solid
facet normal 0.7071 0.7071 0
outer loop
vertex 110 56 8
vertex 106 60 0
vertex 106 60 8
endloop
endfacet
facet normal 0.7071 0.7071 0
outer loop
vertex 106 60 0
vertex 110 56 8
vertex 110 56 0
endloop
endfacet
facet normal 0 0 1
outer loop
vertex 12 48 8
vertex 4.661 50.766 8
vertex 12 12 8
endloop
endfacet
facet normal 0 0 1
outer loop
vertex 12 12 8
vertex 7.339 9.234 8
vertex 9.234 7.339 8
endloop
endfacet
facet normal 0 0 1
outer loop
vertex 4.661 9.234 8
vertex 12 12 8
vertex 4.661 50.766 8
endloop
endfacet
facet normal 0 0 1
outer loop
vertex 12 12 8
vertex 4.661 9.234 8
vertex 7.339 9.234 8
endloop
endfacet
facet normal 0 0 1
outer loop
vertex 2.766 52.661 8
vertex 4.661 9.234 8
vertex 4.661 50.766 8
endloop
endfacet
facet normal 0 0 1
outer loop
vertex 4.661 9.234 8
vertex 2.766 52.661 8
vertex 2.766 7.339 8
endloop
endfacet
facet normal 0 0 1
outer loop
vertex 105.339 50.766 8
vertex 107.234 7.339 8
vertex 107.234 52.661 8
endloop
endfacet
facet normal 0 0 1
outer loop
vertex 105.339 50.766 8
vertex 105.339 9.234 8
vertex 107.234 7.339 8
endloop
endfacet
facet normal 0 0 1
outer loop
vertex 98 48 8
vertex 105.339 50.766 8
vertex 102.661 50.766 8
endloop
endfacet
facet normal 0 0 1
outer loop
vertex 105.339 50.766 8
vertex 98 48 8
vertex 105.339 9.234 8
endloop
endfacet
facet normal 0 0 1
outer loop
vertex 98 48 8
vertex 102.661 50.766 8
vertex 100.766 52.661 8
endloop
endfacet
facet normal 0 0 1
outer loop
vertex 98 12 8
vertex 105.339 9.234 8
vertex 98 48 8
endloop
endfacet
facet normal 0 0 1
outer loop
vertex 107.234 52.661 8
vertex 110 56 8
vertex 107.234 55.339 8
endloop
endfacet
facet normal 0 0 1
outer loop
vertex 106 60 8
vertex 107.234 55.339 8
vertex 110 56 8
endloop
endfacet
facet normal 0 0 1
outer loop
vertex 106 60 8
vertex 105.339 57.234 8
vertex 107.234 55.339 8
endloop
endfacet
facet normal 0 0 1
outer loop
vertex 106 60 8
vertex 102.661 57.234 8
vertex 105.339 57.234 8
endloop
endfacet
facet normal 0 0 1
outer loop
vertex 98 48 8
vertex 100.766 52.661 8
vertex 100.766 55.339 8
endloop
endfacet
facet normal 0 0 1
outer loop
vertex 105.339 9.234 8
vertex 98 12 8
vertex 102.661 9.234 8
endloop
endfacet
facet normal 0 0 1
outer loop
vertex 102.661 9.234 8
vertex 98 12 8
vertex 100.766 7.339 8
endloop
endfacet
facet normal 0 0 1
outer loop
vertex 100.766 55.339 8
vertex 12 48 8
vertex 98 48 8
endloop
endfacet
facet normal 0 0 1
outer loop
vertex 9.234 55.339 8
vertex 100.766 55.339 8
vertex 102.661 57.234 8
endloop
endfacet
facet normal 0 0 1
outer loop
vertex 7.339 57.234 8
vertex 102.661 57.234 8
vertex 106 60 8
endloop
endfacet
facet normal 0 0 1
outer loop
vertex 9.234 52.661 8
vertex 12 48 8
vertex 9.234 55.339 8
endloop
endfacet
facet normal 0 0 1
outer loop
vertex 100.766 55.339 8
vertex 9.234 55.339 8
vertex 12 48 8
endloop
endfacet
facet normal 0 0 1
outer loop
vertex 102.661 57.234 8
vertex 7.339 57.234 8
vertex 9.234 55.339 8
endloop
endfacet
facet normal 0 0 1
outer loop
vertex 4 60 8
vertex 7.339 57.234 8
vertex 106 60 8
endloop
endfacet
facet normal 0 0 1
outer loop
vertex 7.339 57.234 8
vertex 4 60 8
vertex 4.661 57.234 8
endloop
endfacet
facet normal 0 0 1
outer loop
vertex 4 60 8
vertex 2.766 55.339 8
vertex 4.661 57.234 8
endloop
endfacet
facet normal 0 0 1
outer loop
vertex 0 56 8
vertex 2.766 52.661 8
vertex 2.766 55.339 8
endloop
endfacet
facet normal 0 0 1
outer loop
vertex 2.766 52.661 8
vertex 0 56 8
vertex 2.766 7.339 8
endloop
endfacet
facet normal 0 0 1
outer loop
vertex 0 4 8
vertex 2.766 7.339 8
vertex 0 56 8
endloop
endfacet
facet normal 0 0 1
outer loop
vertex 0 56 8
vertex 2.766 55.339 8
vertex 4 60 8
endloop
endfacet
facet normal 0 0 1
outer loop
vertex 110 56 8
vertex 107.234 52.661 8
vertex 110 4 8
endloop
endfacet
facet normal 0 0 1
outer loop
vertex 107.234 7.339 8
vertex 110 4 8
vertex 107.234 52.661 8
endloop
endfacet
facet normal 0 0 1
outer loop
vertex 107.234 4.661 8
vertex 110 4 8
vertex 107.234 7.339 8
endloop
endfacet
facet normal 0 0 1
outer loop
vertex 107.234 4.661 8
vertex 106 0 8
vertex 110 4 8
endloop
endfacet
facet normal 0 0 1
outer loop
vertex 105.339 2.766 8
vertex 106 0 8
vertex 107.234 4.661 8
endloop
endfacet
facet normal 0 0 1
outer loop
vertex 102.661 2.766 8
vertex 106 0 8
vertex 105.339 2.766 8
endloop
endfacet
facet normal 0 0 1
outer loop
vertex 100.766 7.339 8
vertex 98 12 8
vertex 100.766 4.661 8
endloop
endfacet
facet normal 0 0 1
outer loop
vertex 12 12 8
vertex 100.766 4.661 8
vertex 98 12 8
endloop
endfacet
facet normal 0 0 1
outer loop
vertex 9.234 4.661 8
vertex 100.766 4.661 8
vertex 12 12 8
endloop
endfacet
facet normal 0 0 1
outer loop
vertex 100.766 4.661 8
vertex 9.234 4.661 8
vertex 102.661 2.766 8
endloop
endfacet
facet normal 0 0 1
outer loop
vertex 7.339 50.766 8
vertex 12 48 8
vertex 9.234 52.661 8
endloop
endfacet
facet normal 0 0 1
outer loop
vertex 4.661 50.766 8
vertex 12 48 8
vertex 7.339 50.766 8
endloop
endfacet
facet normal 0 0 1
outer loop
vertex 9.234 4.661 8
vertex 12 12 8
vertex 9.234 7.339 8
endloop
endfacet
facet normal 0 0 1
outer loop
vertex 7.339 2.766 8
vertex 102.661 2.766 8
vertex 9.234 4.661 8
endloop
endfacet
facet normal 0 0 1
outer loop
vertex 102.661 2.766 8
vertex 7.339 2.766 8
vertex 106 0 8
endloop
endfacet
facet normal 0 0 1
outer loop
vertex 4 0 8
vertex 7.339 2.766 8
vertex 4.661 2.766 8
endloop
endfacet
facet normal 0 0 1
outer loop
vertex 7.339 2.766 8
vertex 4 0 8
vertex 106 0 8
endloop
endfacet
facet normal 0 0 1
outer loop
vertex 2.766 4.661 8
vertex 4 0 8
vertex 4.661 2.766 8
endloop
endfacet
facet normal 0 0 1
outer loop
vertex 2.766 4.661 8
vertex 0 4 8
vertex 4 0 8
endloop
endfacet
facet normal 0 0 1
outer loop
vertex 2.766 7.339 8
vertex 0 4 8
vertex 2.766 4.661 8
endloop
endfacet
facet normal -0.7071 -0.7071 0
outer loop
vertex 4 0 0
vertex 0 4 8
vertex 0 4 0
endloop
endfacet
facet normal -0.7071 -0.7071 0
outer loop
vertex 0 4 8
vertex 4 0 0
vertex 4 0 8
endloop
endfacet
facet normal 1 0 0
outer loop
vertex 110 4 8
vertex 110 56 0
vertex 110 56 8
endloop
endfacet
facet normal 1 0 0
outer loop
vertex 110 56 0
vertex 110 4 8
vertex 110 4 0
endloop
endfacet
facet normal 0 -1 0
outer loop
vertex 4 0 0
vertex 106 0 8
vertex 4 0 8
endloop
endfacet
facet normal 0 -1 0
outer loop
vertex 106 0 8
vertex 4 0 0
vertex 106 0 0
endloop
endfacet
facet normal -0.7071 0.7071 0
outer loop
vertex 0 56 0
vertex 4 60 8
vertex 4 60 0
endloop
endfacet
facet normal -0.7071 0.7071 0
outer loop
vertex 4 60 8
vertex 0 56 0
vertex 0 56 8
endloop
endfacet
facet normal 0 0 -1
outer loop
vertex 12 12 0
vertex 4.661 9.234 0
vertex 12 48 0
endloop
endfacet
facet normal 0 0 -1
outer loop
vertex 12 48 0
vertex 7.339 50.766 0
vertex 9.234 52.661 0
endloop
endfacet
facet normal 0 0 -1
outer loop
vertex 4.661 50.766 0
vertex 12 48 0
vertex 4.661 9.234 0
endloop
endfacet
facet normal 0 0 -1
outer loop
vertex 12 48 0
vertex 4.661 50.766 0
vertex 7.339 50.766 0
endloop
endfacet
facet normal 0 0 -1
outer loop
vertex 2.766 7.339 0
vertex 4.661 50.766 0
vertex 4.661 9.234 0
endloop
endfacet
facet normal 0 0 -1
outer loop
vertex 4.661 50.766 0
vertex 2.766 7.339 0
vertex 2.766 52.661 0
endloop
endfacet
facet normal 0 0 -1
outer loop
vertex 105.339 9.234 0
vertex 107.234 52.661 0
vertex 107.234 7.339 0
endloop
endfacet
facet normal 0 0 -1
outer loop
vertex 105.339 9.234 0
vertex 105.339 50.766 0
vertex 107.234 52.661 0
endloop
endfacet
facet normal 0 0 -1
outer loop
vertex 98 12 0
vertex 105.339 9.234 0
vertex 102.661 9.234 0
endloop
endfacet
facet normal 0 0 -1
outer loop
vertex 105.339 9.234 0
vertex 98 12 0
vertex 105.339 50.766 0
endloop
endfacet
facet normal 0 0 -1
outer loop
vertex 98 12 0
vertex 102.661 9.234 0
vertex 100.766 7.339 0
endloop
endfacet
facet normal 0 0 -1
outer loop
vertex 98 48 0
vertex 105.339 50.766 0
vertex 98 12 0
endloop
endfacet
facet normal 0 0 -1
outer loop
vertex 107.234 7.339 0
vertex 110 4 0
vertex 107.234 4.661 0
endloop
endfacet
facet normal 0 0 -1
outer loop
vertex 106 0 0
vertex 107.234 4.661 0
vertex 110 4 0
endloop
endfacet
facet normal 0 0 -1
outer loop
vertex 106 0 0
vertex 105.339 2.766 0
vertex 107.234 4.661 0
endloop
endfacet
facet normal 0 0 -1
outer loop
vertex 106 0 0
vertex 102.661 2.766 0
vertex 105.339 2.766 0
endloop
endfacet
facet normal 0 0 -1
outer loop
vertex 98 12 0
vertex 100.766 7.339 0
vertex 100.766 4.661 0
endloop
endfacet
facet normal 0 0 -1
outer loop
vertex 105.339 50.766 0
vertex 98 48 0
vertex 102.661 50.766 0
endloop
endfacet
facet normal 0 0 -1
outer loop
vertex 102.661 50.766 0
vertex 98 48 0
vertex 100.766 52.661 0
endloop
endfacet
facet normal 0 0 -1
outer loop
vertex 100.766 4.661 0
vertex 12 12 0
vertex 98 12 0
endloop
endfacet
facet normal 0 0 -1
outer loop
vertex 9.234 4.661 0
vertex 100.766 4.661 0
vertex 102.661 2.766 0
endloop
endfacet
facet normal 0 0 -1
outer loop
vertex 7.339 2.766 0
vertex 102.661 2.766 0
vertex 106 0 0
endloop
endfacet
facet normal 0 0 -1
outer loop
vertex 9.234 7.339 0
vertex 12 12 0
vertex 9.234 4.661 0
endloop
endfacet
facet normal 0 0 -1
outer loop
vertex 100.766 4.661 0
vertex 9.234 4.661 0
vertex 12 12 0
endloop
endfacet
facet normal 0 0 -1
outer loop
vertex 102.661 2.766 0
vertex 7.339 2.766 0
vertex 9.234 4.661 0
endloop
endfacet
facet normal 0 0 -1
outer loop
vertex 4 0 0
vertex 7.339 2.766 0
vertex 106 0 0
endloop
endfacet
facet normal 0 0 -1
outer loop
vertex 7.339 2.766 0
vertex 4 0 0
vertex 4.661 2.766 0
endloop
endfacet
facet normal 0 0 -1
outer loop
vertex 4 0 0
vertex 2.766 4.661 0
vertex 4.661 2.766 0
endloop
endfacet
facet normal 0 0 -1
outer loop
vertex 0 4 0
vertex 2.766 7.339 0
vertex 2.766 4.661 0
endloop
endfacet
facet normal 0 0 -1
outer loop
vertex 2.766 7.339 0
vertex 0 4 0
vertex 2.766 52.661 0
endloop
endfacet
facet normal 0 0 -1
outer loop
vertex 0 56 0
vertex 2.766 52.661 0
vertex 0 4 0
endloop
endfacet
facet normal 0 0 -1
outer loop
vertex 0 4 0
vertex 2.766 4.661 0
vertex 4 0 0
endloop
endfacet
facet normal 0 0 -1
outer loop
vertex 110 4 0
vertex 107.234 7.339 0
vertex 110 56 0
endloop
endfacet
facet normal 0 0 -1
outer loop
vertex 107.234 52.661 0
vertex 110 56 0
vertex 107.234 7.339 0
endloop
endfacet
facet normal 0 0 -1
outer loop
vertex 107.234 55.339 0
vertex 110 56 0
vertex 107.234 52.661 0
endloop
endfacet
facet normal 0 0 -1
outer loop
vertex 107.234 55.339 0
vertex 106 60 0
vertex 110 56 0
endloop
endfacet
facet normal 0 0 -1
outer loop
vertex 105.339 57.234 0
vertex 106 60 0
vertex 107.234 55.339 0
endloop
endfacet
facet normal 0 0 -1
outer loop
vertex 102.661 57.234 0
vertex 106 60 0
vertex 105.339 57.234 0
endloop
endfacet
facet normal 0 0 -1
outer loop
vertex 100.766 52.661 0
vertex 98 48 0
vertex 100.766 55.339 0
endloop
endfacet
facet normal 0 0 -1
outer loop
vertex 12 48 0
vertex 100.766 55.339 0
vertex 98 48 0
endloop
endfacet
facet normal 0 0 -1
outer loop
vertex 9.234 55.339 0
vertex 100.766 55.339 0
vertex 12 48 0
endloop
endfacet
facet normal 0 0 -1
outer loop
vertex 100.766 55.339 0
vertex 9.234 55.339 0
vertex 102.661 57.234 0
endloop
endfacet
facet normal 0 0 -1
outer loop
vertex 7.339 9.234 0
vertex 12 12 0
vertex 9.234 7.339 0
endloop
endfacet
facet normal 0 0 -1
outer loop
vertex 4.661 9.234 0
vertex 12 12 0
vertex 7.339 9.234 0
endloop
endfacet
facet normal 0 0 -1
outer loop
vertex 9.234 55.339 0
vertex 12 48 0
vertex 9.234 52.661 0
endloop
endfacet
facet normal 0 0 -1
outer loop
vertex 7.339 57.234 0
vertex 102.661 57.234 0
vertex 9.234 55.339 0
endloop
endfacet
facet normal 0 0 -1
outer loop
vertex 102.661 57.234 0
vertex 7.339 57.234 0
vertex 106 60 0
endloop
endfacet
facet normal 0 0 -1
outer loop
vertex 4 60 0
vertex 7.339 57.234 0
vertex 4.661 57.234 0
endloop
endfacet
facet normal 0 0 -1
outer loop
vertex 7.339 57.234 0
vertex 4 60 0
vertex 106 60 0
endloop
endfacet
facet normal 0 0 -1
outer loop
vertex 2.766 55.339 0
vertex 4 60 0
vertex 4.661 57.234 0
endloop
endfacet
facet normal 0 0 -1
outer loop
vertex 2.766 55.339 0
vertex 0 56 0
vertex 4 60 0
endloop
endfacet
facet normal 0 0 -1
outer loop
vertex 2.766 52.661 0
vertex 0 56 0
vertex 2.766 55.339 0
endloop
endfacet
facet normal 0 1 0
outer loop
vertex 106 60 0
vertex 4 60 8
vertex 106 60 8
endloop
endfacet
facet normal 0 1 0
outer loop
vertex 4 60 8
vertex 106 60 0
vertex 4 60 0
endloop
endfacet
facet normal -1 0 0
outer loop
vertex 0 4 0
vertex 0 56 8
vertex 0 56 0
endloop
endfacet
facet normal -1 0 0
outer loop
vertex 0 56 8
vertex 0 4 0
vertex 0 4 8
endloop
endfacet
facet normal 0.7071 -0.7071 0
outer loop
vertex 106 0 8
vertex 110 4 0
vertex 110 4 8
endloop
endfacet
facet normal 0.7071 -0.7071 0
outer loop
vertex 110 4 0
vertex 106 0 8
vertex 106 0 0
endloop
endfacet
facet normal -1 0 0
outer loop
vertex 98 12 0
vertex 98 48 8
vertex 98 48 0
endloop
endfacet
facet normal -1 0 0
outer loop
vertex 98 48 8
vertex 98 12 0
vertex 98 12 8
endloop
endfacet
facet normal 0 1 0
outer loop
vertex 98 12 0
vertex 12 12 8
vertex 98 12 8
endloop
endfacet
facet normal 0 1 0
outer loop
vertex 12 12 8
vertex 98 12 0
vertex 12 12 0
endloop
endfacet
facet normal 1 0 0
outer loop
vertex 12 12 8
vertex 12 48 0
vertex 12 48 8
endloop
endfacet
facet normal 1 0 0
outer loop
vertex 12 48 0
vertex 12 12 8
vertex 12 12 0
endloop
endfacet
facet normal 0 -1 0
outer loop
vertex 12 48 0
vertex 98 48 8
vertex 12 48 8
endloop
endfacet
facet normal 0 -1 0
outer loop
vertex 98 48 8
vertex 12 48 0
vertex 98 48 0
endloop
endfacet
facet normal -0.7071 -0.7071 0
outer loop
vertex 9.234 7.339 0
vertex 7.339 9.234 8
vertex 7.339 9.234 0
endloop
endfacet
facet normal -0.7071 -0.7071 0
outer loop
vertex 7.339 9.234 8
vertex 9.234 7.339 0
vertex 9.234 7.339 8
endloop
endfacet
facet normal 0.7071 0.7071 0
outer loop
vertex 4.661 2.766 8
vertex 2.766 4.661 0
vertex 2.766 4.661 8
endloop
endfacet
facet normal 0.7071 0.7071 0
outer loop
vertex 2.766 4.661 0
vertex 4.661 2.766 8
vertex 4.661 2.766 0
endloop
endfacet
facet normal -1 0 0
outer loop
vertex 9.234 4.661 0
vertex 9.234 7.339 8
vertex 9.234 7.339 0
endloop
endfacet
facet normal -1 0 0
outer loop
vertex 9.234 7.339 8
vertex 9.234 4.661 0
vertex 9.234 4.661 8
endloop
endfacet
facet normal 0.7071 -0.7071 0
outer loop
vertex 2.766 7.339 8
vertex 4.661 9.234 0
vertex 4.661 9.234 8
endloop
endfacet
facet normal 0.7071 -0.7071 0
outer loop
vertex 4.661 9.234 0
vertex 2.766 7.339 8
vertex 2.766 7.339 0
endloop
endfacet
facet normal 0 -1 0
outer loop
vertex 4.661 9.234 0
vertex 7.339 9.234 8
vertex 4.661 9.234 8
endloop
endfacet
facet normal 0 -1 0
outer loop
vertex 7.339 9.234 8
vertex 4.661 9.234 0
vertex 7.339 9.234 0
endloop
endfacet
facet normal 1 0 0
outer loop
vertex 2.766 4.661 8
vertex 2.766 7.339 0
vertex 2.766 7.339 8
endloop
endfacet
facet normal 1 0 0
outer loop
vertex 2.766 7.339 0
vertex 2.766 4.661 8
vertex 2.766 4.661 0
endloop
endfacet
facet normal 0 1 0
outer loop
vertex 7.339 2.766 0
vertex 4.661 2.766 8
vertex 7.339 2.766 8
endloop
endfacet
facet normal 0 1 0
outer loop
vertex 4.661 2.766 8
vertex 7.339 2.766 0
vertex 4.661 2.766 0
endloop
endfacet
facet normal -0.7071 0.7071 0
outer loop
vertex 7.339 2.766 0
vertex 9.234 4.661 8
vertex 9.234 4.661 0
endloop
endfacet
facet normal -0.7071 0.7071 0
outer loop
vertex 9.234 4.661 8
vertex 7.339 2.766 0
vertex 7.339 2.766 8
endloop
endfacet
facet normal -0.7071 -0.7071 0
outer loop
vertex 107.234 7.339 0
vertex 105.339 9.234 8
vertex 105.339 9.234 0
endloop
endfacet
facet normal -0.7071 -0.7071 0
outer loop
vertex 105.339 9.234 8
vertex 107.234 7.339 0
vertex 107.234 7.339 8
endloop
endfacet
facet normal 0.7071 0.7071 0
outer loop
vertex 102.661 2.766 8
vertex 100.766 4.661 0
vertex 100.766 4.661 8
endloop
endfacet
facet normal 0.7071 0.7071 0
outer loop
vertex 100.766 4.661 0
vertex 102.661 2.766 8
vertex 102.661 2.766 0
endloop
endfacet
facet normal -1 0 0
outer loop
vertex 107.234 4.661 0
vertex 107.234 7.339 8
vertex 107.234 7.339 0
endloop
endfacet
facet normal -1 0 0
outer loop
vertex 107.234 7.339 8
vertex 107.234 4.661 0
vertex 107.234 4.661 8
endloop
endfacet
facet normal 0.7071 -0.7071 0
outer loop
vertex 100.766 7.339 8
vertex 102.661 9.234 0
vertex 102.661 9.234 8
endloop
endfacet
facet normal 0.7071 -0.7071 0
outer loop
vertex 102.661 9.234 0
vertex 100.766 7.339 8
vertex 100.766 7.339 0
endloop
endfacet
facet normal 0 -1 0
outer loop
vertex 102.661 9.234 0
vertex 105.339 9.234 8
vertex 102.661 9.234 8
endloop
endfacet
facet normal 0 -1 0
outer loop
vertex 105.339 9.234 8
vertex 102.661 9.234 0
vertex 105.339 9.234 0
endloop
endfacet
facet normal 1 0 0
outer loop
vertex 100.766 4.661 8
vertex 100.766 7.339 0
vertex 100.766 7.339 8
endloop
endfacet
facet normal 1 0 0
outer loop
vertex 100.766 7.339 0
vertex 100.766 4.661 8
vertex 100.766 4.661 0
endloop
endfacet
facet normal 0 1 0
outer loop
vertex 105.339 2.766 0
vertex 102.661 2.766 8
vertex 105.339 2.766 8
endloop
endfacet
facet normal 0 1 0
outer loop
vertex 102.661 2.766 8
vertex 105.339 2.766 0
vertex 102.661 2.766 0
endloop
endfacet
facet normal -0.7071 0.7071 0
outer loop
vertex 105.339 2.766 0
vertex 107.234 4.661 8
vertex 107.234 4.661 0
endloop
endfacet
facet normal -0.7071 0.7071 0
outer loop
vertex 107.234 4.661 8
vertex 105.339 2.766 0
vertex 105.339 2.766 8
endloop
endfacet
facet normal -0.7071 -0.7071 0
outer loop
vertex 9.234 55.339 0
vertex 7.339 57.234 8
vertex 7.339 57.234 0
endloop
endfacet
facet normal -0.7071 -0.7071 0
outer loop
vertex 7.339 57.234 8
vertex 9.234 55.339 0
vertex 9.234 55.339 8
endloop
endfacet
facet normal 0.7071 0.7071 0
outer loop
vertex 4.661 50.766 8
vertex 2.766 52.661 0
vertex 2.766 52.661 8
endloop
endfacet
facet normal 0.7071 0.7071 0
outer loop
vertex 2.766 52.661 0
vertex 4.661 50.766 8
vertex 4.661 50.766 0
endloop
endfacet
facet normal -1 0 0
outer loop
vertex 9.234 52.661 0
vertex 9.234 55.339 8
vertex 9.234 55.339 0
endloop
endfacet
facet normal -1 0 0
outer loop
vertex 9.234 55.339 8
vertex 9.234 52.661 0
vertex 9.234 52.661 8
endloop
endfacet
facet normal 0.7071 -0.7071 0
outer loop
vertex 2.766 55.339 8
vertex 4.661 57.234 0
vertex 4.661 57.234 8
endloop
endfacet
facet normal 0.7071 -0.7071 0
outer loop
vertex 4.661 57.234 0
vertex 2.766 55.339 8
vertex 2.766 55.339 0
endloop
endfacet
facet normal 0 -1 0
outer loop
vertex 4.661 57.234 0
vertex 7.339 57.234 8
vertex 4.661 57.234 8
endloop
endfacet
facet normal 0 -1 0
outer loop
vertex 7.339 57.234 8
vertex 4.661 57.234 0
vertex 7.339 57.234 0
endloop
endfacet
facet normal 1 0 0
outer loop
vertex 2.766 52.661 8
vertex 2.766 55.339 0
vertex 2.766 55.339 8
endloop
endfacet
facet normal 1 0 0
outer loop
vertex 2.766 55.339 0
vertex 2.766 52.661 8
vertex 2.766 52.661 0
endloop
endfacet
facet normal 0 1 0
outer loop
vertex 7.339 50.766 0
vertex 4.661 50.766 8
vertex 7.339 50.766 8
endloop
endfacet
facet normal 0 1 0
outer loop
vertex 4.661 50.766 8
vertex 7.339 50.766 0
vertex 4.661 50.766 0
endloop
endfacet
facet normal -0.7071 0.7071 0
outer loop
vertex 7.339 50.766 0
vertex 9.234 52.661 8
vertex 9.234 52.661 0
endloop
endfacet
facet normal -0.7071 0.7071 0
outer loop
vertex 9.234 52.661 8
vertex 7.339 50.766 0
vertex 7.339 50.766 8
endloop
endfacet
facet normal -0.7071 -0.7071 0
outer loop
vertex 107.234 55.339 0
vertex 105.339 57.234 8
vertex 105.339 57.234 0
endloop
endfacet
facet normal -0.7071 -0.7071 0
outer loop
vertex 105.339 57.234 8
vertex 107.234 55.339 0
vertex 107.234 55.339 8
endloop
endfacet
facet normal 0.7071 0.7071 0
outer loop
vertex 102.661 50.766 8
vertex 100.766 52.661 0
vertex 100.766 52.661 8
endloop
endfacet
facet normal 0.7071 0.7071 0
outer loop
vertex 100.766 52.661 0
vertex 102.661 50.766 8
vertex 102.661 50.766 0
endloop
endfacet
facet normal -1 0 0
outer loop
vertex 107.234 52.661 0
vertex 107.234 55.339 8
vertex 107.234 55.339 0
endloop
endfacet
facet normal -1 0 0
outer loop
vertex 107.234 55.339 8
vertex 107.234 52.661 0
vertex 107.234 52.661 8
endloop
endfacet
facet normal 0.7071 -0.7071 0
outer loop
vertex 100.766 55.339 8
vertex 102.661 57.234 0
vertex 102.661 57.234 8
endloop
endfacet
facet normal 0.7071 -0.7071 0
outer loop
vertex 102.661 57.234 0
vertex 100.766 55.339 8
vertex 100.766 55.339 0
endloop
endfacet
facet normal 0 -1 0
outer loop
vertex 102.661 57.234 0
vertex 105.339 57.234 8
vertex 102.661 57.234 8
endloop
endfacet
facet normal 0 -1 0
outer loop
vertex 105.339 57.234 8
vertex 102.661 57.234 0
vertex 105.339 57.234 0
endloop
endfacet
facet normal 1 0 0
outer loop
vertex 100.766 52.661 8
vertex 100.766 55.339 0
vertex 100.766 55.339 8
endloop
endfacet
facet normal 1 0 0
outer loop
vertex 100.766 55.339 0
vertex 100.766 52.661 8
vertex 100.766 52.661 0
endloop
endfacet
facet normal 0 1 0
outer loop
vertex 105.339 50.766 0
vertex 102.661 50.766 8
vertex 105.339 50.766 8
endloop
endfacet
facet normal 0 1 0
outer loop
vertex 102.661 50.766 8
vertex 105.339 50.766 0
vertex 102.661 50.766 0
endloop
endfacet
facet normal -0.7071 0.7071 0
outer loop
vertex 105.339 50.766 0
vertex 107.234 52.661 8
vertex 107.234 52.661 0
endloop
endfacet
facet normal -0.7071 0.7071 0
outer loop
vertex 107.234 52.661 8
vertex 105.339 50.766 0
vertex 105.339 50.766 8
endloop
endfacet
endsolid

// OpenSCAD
$fn = 32;

// ----------------------------------------------------------------------
// Frame plate: 110 x 60 frame, 12 mm rails
// ----------------------------------------------------------------------

// --- parameters (mm) ---
plate_l = 110;            // plate length, X
plate_w = 60;             // plate width, Y
plate_t = 8;              // plate thickness, Z (extrusion height)
corner_c = 4;             // corner chamfer
frame_bar = 12;           // frame rail width
bolt_r = 3.5;             // corner bolt window radius
bolt_inset = 6;           // bolt centre inset from the edges

win_l = plate_l - 2 * frame_bar;  // window length
win_w = plate_w - 2 * frame_bar;  // window width
bolt_d = 2 * bolt_r;  // corner hole diameter

profile = [[4, 0], [106, 0], [110, 4], [110, 56], [106, 60], [4, 60], [0, 56], [0, 4]];  // primary outline, 8 points, counter clockwise
void_1 = [[12, 12], [98, 12], [98, 48], [12, 48]];  // the window, 4 points
void_2 = [[9.234, 7.339], [7.339, 9.234], [4.661, 9.234], [2.766, 7.339], [2.766, 4.661], [4.661, 2.766], [7.339, 2.766], [9.234, 4.661]];  // corner bolt window, 8 points
void_3 = [[107.234, 7.339], [105.339, 9.234], [102.661, 9.234], [100.766, 7.339], [100.766, 4.661], [102.661, 2.766], [105.339, 2.766], [107.234, 4.661]];  // corner bolt window, 8 points
void_4 = [[9.234, 55.339], [7.339, 57.234], [4.661, 57.234], [2.766, 55.339], [2.766, 52.661], [4.661, 50.766], [7.339, 50.766], [9.234, 52.661]];  // corner bolt window, 8 points
void_5 = [[107.234, 55.339], [105.339, 57.234], [102.661, 57.234], [100.766, 55.339], [100.766, 52.661], [102.661, 50.766], [105.339, 50.766], [107.234, 52.661]];  // corner bolt window, 8 points

// --- the one profile operation ---
difference() {
  linear_extrude(height = plate_t) polygon(points = profile);
  translate([0, 0, -1])
    linear_extrude(height = plate_t + 2) polygon(points = void_1);
  translate([0, 0, -1])
    linear_extrude(height = plate_t + 2) polygon(points = void_2);
  translate([0, 0, -1])
    linear_extrude(height = plate_t + 2) polygon(points = void_3);
  translate([0, 0, -1])
    linear_extrude(height = plate_t + 2) polygon(points = void_4);
  translate([0, 0, -1])
    linear_extrude(height = plate_t + 2) polygon(points = void_5);
}
